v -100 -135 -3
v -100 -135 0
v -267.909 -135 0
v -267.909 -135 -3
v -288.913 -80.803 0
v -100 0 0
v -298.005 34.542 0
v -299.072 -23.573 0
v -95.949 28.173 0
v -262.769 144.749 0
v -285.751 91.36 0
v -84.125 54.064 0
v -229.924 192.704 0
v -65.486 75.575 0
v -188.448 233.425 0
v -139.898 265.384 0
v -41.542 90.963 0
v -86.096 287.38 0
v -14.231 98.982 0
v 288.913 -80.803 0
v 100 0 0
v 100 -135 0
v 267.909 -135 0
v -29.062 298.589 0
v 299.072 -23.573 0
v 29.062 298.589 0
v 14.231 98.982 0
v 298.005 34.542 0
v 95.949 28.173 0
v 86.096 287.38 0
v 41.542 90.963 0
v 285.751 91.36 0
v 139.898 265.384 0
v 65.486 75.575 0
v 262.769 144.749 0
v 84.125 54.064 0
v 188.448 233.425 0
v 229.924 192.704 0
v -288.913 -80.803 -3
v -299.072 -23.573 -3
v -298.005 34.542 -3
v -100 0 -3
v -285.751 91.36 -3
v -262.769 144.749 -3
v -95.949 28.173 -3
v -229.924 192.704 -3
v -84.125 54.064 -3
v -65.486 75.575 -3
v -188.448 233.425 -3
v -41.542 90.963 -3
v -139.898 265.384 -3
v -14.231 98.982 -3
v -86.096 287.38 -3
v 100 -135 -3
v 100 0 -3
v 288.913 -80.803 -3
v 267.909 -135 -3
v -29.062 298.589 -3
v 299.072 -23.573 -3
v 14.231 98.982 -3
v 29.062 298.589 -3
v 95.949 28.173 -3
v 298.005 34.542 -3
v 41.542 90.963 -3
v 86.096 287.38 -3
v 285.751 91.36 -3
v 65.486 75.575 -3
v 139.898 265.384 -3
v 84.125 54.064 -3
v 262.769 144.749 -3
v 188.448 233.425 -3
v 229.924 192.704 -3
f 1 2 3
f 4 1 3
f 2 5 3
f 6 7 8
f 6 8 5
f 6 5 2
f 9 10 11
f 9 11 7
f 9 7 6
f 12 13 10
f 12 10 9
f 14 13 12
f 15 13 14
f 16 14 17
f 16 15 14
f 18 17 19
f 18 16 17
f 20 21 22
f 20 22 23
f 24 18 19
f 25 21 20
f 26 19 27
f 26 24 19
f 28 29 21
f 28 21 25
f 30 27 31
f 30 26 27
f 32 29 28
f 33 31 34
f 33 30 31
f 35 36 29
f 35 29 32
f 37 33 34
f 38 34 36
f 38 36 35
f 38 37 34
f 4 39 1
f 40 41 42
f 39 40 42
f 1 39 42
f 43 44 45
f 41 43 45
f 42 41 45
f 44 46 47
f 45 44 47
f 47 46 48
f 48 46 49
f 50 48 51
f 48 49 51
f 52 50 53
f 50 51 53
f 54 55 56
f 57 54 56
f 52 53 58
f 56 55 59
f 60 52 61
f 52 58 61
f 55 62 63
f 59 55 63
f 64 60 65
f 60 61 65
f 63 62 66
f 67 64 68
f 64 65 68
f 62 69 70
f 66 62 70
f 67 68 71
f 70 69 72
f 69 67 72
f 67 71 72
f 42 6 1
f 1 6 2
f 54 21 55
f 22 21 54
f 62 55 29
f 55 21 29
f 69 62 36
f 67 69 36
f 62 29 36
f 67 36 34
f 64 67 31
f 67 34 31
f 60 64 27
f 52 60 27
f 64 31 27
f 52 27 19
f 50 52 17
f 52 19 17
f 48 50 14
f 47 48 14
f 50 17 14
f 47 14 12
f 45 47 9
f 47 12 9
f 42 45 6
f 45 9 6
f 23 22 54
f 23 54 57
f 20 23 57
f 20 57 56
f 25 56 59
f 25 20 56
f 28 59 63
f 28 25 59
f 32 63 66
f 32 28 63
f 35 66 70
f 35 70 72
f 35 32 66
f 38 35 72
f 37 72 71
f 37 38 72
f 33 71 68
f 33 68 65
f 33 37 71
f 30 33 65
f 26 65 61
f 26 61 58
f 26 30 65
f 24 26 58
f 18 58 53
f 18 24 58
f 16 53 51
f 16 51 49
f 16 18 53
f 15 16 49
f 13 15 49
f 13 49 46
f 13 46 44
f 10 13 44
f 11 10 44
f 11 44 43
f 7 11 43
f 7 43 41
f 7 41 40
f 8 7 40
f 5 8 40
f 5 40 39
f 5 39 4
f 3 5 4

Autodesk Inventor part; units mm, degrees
ref_plane "YZ Plane" through (0, 0, 0) normal (1, 0, 0) x (0, 1, 0)
ref_plane "XZ Plane" through (0, 0, 0) normal (0, 1, 0) x (-1, 0, 0)
ref_plane "XY Plane" through (0, 0, 0) normal (0, 0, 1) x (1, 0, 0)
sketch "Sketch1" plane through (0, 0, 0) normal (0, 0, 1) x (1, 0, 0)
  arc A0 (100, 0) -> (-100, 0) centre (0, 0) ccw
  arc A1 (267.9086, -135) -> (-267.9086, -135) centre (0, 0) ccw
  line L0 (-100, 0) -> (-100, -135)
  line L1 (-100, -135) -> (-267.9086, -135)
  line L2 (100, 0) -> (100, -135)
  line L3 (100, -135) -> (267.9086, -135)
  dimension "d0" = 200
  dimension "d2" = 600
  dimension "d3" = 135
extrude "Extrusion1" add sketch "Sketch1" against normal blind 3
sketch "Sketch2" plane through (0, 0, 0) normal (0, 0, 1) x (1, 0, 0)
  arc A0 (100, 0) -> (-100, 0) centre (0, 0) ccw projected
  line L0 (100, 0) -> (100, -135) projected
  line L1 (100, -135) -> (267.9086, -135) projected
  arc A1 (267.9086, -135) -> (-267.9086, -135) centre (0, 0) ccw projected
  line L2 (-267.9086, -135) -> (-100, -135) projected
  line L3 (-100, -135) -> (-100, 0) projected
  line L4 (-101.709, 282.2327) -> (100, 282.2327)
  line L5 (100, 282.2327) -> (100, 100)
  line L6 (100, 100) -> (-101.709, 100)
  line L7 (-101.709, 100) -> (-101.709, 282.2327)
properties part number "bed"
